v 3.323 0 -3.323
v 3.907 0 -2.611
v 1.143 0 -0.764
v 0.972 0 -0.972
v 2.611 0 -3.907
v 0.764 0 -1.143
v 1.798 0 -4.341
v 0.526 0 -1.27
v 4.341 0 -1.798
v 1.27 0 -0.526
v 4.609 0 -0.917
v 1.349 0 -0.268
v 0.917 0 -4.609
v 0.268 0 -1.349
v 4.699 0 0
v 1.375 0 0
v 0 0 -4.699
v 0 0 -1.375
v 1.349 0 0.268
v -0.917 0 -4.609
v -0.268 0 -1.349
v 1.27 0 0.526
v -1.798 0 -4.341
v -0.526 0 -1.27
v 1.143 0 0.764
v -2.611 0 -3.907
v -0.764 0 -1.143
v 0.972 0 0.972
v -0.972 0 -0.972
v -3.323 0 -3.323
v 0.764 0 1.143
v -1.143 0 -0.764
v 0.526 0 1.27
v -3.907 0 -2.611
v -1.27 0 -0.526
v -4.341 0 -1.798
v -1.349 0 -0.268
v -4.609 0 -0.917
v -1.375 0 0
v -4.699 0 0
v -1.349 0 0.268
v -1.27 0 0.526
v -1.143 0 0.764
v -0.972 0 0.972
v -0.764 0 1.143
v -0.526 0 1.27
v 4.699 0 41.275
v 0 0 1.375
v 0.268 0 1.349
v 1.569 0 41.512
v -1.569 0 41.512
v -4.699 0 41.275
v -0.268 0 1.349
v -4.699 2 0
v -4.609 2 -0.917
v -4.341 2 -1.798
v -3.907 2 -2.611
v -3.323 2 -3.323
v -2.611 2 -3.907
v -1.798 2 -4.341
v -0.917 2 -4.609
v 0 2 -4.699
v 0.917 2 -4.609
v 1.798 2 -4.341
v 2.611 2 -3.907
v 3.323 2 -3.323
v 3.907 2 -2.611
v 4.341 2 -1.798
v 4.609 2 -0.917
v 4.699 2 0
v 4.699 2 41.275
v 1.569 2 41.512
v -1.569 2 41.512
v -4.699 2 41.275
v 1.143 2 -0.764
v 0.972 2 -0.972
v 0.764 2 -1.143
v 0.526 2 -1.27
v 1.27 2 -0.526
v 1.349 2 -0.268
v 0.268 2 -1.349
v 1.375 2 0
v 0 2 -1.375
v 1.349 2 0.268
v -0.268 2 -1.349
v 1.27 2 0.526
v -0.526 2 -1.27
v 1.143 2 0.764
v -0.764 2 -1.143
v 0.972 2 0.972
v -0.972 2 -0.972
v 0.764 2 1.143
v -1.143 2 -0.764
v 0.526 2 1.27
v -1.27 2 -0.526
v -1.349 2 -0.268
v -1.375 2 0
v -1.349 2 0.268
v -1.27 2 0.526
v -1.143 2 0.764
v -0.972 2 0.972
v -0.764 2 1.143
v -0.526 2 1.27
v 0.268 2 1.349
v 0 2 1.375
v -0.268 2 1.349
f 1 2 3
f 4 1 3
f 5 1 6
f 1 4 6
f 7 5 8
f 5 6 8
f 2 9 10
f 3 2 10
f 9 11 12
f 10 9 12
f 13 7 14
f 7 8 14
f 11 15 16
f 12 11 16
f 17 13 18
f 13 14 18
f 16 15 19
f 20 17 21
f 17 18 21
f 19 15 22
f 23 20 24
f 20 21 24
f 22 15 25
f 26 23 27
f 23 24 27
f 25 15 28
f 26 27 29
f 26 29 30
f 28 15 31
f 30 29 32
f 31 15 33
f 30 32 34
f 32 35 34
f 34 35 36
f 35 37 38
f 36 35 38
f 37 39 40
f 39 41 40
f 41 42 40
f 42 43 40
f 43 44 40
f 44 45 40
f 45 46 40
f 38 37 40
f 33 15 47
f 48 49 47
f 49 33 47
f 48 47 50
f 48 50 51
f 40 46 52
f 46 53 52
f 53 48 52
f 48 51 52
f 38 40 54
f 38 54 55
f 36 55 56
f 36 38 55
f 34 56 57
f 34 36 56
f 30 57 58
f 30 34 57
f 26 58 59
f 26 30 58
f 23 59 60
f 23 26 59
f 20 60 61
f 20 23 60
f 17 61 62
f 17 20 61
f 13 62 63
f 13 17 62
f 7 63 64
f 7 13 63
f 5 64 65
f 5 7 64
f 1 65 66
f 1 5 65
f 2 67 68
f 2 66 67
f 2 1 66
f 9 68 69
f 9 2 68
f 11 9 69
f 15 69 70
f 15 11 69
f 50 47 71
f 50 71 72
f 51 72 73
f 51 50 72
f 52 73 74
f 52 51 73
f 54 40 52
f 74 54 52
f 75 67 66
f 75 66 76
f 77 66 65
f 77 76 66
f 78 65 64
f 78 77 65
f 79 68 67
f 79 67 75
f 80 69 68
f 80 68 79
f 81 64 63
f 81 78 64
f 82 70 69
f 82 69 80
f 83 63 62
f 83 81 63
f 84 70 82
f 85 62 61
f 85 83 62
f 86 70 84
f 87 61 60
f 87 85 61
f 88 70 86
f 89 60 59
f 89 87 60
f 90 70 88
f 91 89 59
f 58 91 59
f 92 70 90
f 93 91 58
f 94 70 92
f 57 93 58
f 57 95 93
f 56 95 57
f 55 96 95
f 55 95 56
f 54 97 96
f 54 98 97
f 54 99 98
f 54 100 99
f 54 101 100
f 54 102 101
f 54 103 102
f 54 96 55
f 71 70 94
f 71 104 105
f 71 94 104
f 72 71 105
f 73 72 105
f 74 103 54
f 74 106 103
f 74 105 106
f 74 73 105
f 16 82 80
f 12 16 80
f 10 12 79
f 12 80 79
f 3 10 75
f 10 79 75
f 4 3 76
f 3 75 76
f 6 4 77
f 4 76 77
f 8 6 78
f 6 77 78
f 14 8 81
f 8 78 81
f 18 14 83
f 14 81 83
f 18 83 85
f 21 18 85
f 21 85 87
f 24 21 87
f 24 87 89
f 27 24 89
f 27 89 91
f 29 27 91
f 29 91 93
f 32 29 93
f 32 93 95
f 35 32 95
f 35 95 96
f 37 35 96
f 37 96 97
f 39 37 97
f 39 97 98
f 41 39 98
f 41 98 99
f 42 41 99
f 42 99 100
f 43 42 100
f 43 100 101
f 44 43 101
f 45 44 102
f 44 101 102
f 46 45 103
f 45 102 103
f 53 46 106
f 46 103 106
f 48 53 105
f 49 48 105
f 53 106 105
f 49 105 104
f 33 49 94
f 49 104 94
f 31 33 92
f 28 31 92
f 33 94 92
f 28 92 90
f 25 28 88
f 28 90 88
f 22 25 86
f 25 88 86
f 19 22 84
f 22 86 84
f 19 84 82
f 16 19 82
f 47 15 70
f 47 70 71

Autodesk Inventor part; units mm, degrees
ref_plane "YZ Plane" through (0, 0, 0) normal (1, 0, 0) x (0, 1, 0)
ref_plane "XZ Plane" through (0, 0, 0) normal (0, 1, 0) x (-1, 0, 0)
ref_plane "XY Plane" through (0, 0, 0) normal (0, 0, 1) x (1, 0, 0)
sketch "Sketch1" plane through (0, 0, 0) normal (0, 1, 0) x (-1, 0, 0)
  circle A0 centre (0, 0) radius 41.5415
  circle A1 centre (0, 0) radius 4.699
  line L0 (4.699, 0) -> (4.699, 41.2749)
  line L1 (-4.699, 0) -> (-4.699, 41.2749)
  dimension "d0" = 83.083
  dimension "d1" = 9.398
extrude "Extrusion1" add sketch "Sketch1" along normal blind 2 contours L0 A1 L1 A0 | A1 picked at (-0.1888, 29.2295)
sketch "Sketch2" plane through (0, 2, 0) normal (0, 1, 0) x (1, 0, 0)
  circle A0 centre (0, 0) radius 1.375
  dimension "d4" = 2.75
extrude "Extrusion2" cut sketch "Sketch2" against normal through all
sketch "Sketch3" plane through (0, 2, 0) normal (0, 1, 0) x (1, 0, 0)
  circle A0 centre (0, 0) radius 1.375 projected
  circle A1 centre (0, 0) radius 4.699
  circle A2 centre (0, 0) radius 1.375 projected
  arc A3 (4.699, 0) -> (-4.699, 0) centre (0, 0) ccw projected
  line L0 (-4.699, 0) -> (-4.699, -41.2749) projected
  arc A4 (-4.699, -41.2749) -> (4.699, -41.2749) centre (0, 0) ccw projected
  line L1 (4.699, -41.2749) -> (4.699, 0) projected
  arc A5 (4.699, 0) -> (-4.699, 0) centre (0, 0) ccw projected
  point P0 (-4.699, 0)
properties part number "Minute hand test 2"
